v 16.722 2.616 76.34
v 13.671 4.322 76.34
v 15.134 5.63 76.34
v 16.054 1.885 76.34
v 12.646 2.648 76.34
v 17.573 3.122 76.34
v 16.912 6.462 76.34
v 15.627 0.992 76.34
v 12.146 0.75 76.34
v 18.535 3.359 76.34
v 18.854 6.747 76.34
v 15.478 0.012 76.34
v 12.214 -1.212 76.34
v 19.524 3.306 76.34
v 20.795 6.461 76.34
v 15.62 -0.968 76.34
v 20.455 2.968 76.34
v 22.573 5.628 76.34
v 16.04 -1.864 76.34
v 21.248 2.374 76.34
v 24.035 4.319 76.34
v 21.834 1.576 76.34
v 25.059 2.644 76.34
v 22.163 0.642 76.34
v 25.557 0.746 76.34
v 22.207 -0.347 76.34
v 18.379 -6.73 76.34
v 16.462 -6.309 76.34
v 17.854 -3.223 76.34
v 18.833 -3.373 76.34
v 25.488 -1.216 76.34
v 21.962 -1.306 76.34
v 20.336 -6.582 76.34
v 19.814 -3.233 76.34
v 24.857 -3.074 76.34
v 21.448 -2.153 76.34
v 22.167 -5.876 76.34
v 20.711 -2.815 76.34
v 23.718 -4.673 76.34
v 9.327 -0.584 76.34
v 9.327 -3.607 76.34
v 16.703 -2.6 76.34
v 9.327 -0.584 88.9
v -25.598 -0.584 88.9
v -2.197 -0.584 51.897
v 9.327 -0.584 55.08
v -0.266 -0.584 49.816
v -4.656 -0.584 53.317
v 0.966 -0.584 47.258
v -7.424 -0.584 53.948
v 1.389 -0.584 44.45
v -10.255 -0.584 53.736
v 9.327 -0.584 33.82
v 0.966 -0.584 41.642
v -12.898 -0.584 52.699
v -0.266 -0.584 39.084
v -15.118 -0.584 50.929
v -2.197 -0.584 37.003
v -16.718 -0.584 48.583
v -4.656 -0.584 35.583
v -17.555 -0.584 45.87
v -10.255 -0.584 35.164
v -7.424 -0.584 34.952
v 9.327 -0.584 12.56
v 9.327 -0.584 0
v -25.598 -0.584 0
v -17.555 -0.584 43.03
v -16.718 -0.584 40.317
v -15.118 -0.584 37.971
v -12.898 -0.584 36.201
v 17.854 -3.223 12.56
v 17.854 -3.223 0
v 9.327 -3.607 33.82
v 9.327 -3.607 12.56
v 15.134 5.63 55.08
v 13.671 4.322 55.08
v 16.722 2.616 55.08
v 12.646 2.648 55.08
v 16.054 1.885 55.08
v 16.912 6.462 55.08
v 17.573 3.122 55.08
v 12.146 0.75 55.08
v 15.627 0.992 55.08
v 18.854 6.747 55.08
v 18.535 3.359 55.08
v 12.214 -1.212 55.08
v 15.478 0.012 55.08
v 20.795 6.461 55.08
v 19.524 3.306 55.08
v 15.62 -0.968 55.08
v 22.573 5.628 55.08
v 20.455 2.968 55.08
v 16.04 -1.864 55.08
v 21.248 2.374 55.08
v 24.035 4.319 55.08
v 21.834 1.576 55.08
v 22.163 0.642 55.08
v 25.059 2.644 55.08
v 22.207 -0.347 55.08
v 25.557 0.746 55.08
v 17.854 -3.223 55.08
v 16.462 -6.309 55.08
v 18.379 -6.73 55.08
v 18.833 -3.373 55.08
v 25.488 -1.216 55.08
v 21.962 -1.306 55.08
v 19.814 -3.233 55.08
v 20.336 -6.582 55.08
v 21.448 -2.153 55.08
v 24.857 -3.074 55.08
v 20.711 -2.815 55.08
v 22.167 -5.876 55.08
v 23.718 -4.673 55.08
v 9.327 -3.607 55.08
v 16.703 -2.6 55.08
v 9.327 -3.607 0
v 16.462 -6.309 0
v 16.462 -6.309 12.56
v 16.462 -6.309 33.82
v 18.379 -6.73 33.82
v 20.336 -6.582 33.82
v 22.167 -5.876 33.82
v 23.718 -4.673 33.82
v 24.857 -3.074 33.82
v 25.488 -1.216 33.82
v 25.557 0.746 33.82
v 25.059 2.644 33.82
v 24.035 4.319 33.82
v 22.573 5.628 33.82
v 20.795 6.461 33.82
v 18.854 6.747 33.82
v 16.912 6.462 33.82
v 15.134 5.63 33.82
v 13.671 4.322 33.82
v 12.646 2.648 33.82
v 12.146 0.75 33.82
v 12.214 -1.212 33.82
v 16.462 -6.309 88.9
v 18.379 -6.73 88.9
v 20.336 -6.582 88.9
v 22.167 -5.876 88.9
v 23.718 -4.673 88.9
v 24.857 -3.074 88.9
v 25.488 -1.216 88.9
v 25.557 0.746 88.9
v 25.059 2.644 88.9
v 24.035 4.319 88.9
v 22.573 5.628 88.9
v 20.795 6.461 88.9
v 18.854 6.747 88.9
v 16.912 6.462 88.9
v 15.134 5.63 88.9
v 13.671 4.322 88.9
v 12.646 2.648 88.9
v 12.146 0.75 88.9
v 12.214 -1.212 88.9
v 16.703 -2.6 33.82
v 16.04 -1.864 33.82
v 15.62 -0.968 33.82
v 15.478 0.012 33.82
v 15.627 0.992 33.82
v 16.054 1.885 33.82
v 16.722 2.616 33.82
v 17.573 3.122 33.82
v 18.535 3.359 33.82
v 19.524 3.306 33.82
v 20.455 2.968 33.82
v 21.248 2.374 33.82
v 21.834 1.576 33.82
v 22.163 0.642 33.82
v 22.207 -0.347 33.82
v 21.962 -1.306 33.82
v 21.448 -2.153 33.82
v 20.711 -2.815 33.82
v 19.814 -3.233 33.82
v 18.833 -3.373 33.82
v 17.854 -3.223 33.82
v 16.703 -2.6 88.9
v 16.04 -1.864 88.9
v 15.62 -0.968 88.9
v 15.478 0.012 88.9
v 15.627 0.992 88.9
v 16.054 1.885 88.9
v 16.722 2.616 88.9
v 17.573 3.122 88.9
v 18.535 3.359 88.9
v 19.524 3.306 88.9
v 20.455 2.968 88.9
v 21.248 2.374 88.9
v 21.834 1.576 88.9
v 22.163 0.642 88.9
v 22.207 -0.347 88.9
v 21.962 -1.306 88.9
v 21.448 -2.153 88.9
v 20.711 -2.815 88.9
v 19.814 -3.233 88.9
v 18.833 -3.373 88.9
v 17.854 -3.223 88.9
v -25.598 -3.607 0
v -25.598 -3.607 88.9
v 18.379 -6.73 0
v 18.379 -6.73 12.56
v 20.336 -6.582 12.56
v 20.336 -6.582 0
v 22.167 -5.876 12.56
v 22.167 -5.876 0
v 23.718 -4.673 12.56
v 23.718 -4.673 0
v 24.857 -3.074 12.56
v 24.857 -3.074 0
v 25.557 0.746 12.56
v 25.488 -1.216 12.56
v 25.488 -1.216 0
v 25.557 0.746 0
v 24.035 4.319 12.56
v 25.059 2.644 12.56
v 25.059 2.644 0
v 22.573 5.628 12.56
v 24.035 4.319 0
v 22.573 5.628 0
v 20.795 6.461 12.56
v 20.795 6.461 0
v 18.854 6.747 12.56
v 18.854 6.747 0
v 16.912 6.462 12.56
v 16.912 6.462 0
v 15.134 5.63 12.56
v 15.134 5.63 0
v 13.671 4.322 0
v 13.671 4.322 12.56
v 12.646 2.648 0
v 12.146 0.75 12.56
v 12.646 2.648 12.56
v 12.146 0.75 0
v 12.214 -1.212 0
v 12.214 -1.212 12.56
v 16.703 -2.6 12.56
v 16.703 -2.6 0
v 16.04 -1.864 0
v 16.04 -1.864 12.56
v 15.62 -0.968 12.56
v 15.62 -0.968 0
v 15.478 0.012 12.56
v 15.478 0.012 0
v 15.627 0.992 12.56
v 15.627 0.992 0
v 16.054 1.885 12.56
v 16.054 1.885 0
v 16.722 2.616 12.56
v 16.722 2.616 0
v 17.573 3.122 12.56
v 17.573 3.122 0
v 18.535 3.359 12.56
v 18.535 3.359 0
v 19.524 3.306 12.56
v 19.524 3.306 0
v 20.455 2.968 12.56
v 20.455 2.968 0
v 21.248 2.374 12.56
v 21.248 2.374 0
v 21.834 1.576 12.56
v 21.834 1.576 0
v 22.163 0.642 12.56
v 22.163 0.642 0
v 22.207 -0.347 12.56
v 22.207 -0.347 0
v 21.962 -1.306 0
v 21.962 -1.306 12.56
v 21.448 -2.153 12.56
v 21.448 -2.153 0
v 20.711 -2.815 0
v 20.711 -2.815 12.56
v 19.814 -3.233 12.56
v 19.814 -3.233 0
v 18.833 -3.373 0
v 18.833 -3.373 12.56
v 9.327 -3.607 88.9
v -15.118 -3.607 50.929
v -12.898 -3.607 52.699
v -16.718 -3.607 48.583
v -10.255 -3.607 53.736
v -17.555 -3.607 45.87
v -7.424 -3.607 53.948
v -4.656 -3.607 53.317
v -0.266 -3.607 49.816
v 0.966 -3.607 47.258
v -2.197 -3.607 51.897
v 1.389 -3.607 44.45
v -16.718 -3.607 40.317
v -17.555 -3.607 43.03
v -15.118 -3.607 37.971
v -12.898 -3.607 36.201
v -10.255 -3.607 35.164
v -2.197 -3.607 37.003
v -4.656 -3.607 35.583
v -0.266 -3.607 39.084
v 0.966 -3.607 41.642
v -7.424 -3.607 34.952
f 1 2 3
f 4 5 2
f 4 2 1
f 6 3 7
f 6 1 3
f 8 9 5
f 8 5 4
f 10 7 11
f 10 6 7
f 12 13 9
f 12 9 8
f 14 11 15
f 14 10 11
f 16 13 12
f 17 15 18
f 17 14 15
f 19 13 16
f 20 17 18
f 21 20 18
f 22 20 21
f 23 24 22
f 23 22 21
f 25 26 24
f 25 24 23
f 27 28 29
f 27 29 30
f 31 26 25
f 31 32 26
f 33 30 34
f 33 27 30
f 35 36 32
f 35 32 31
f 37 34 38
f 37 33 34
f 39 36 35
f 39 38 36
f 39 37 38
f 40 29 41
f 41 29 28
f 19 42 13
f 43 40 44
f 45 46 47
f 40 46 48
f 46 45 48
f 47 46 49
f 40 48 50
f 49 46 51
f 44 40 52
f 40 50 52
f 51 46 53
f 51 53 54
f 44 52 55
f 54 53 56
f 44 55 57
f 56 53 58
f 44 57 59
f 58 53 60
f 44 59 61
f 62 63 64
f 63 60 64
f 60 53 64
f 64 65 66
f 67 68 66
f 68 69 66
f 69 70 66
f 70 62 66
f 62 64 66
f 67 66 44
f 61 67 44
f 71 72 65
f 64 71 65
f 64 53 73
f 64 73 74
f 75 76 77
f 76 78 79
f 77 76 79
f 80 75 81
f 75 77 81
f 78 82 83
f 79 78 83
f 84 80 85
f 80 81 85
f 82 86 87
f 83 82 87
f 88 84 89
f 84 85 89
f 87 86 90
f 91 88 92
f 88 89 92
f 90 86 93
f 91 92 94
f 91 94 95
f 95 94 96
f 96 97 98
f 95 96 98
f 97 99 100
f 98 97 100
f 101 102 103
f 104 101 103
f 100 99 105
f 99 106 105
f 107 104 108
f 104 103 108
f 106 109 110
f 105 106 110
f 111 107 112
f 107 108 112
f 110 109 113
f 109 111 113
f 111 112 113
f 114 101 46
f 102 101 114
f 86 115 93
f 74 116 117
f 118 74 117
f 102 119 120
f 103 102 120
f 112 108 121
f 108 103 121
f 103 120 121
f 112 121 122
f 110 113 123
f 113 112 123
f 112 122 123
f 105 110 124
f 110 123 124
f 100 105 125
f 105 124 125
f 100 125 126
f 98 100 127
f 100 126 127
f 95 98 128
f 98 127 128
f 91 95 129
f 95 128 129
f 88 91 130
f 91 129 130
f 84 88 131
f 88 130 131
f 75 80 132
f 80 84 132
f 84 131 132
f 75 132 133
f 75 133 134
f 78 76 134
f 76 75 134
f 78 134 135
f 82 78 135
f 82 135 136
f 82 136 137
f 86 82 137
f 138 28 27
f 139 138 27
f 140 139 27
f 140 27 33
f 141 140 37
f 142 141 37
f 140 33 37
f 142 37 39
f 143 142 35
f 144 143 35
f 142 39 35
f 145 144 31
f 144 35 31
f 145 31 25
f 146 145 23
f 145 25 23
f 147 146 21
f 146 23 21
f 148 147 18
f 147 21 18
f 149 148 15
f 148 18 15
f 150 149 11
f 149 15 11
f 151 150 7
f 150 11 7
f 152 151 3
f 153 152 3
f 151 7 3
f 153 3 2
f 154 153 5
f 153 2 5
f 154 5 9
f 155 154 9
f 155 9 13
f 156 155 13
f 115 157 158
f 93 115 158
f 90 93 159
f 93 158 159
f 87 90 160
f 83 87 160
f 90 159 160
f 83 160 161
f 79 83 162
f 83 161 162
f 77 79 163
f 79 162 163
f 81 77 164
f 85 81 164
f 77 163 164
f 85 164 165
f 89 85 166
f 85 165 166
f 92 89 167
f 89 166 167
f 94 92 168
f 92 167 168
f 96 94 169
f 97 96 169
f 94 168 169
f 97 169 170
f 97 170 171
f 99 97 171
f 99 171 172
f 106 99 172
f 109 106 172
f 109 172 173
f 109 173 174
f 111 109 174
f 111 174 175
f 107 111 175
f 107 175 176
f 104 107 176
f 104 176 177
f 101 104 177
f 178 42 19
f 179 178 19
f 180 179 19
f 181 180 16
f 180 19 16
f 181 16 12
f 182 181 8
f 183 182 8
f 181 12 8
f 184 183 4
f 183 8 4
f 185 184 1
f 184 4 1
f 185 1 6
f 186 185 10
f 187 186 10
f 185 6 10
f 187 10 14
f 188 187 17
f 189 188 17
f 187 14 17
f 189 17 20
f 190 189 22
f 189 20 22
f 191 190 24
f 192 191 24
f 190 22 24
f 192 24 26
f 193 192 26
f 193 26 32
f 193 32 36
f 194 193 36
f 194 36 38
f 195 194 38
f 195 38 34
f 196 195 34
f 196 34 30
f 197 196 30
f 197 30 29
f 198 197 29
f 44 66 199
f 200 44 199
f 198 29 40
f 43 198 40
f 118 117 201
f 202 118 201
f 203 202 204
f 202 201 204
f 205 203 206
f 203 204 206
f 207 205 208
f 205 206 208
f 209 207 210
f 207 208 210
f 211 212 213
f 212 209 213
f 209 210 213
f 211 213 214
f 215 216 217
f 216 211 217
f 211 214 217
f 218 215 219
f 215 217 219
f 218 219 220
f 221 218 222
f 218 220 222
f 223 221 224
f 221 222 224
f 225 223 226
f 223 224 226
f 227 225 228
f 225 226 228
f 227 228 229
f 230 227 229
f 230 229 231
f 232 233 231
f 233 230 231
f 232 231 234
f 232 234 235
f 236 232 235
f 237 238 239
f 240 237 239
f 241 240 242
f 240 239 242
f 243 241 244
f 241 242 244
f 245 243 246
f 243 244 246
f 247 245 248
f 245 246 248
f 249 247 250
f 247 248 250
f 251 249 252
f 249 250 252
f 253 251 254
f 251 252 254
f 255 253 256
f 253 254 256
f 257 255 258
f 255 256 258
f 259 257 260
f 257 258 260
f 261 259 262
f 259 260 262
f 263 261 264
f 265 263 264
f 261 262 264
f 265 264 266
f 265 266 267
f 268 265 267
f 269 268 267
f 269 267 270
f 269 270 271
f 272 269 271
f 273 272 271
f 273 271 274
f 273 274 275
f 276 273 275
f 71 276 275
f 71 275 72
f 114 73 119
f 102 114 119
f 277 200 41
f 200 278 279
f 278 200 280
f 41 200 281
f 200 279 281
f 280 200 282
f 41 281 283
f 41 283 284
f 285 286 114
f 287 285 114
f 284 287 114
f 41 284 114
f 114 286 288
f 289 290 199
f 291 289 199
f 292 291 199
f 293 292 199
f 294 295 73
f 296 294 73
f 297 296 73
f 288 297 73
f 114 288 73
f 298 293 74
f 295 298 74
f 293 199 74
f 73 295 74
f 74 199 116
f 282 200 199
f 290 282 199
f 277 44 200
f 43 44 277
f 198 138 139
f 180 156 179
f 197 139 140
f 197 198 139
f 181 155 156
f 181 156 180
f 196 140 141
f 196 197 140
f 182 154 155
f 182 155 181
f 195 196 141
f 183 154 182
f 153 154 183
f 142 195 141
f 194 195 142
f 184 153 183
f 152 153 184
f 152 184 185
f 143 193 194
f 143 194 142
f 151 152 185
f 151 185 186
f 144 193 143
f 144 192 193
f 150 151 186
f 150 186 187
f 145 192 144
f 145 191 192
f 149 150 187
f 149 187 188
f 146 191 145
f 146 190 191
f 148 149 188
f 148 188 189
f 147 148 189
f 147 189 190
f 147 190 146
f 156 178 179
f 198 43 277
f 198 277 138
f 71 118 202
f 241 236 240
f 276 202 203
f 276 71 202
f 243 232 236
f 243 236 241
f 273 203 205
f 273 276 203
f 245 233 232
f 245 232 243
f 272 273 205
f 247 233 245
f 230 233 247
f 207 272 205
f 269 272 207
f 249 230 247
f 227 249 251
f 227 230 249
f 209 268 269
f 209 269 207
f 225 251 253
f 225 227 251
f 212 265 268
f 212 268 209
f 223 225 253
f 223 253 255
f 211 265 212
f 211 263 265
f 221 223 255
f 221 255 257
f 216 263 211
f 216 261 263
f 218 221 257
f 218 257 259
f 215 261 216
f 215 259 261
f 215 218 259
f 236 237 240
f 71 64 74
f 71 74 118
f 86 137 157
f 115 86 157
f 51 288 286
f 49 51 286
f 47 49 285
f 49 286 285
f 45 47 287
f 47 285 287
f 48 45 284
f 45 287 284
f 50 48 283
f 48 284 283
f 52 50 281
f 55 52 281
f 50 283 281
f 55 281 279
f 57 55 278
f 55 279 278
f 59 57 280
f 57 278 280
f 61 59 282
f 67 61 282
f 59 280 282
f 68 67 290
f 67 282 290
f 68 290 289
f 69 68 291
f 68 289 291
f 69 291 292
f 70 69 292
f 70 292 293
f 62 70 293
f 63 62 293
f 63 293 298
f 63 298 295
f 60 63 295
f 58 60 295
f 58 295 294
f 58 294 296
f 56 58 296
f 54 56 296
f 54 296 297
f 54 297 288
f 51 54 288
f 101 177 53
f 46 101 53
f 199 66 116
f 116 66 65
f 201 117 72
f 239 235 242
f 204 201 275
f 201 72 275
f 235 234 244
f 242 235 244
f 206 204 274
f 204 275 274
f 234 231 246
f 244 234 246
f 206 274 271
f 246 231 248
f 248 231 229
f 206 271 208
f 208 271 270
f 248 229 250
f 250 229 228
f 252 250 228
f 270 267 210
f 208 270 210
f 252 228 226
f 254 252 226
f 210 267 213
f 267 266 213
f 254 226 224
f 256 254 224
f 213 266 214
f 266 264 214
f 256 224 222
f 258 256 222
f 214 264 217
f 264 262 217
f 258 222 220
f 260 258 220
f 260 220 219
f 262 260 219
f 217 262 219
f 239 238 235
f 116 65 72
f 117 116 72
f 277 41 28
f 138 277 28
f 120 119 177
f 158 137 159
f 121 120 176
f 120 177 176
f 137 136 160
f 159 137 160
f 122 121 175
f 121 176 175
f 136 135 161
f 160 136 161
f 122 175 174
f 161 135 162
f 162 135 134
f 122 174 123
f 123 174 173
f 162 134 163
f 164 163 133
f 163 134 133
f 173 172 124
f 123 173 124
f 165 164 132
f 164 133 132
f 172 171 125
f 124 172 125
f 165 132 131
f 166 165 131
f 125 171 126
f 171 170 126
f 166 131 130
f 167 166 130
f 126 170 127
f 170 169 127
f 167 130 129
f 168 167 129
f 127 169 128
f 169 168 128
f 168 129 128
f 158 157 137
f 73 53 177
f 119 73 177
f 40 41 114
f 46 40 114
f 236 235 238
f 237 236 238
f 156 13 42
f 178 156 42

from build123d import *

# Parameters (mm, degrees)
BOSS_EXTRUDE1_DEPTH = 88.9
SKETCH2_W           = 16.271875
SKETCH2_H           = 21.2598
CUT_EXTRUDE1_DEPTH  = 44.45
SKETCH3_R           = 9.525
CUT_EXTRUDE2_DEPTH  = 88.9


with BuildPart() as part:
    # Sketch1 → Boss-Extrude1 (new body)
    with BuildSketch(Plane.XY):
        with BuildLine():
            Line((9.3265625, -3.6068), (16.461695383, -6.309426078))
            ThreePointArc((16.461695383, -6.309426078), (24.035016902, 4.318810338), (12.214407069, -1.21181271))
            Line((12.214407069, -1.21181271), (16.702709255, -2.600482704))
            ThreePointArc((16.702709255, -2.600482704), (20.455010949, 2.968001624), (17.854463061, -3.222712099))
            Line((17.854463061, -3.222712099), (9.3265625, -0.5842))
            Line((9.3265625, -0.5842), (-25.5984375, -0.5842))
            Line((-25.5984375, -0.5842), (-25.5984375, -3.6068))
            Line((-25.5984375, -3.6068), (9.3265625, -3.6068))
        make_face()
    extrude(amount=BOSS_EXTRUDE1_DEPTH)

    # Sketch2 → Cut-Extrude1 (cut, symmetric)
    with BuildSketch(Plane(origin=(0, -0.5842, 0), x_dir=(1, 0, 0), z_dir=(0, 1, 0))):
        with Locations((17.4625, -65.7098)):
            Rectangle(SKETCH2_W, SKETCH2_H)
        with Locations((17.4625, -23.1902)):
            Rectangle(SKETCH2_W, SKETCH2_H)
    extrude(amount=CUT_EXTRUDE1_DEPTH, both=True, mode=Mode.SUBTRACT)

    # Sketch3 → Cut-Extrude2 (cut)
    with BuildSketch(Plane.XZ.offset(3.6068)):
        with Locations((-8.1359375, 44.45)):
            Circle(SKETCH3_R)
    extrude(amount=-CUT_EXTRUDE2_DEPTH, mode=Mode.SUBTRACT)


solid = part.part
